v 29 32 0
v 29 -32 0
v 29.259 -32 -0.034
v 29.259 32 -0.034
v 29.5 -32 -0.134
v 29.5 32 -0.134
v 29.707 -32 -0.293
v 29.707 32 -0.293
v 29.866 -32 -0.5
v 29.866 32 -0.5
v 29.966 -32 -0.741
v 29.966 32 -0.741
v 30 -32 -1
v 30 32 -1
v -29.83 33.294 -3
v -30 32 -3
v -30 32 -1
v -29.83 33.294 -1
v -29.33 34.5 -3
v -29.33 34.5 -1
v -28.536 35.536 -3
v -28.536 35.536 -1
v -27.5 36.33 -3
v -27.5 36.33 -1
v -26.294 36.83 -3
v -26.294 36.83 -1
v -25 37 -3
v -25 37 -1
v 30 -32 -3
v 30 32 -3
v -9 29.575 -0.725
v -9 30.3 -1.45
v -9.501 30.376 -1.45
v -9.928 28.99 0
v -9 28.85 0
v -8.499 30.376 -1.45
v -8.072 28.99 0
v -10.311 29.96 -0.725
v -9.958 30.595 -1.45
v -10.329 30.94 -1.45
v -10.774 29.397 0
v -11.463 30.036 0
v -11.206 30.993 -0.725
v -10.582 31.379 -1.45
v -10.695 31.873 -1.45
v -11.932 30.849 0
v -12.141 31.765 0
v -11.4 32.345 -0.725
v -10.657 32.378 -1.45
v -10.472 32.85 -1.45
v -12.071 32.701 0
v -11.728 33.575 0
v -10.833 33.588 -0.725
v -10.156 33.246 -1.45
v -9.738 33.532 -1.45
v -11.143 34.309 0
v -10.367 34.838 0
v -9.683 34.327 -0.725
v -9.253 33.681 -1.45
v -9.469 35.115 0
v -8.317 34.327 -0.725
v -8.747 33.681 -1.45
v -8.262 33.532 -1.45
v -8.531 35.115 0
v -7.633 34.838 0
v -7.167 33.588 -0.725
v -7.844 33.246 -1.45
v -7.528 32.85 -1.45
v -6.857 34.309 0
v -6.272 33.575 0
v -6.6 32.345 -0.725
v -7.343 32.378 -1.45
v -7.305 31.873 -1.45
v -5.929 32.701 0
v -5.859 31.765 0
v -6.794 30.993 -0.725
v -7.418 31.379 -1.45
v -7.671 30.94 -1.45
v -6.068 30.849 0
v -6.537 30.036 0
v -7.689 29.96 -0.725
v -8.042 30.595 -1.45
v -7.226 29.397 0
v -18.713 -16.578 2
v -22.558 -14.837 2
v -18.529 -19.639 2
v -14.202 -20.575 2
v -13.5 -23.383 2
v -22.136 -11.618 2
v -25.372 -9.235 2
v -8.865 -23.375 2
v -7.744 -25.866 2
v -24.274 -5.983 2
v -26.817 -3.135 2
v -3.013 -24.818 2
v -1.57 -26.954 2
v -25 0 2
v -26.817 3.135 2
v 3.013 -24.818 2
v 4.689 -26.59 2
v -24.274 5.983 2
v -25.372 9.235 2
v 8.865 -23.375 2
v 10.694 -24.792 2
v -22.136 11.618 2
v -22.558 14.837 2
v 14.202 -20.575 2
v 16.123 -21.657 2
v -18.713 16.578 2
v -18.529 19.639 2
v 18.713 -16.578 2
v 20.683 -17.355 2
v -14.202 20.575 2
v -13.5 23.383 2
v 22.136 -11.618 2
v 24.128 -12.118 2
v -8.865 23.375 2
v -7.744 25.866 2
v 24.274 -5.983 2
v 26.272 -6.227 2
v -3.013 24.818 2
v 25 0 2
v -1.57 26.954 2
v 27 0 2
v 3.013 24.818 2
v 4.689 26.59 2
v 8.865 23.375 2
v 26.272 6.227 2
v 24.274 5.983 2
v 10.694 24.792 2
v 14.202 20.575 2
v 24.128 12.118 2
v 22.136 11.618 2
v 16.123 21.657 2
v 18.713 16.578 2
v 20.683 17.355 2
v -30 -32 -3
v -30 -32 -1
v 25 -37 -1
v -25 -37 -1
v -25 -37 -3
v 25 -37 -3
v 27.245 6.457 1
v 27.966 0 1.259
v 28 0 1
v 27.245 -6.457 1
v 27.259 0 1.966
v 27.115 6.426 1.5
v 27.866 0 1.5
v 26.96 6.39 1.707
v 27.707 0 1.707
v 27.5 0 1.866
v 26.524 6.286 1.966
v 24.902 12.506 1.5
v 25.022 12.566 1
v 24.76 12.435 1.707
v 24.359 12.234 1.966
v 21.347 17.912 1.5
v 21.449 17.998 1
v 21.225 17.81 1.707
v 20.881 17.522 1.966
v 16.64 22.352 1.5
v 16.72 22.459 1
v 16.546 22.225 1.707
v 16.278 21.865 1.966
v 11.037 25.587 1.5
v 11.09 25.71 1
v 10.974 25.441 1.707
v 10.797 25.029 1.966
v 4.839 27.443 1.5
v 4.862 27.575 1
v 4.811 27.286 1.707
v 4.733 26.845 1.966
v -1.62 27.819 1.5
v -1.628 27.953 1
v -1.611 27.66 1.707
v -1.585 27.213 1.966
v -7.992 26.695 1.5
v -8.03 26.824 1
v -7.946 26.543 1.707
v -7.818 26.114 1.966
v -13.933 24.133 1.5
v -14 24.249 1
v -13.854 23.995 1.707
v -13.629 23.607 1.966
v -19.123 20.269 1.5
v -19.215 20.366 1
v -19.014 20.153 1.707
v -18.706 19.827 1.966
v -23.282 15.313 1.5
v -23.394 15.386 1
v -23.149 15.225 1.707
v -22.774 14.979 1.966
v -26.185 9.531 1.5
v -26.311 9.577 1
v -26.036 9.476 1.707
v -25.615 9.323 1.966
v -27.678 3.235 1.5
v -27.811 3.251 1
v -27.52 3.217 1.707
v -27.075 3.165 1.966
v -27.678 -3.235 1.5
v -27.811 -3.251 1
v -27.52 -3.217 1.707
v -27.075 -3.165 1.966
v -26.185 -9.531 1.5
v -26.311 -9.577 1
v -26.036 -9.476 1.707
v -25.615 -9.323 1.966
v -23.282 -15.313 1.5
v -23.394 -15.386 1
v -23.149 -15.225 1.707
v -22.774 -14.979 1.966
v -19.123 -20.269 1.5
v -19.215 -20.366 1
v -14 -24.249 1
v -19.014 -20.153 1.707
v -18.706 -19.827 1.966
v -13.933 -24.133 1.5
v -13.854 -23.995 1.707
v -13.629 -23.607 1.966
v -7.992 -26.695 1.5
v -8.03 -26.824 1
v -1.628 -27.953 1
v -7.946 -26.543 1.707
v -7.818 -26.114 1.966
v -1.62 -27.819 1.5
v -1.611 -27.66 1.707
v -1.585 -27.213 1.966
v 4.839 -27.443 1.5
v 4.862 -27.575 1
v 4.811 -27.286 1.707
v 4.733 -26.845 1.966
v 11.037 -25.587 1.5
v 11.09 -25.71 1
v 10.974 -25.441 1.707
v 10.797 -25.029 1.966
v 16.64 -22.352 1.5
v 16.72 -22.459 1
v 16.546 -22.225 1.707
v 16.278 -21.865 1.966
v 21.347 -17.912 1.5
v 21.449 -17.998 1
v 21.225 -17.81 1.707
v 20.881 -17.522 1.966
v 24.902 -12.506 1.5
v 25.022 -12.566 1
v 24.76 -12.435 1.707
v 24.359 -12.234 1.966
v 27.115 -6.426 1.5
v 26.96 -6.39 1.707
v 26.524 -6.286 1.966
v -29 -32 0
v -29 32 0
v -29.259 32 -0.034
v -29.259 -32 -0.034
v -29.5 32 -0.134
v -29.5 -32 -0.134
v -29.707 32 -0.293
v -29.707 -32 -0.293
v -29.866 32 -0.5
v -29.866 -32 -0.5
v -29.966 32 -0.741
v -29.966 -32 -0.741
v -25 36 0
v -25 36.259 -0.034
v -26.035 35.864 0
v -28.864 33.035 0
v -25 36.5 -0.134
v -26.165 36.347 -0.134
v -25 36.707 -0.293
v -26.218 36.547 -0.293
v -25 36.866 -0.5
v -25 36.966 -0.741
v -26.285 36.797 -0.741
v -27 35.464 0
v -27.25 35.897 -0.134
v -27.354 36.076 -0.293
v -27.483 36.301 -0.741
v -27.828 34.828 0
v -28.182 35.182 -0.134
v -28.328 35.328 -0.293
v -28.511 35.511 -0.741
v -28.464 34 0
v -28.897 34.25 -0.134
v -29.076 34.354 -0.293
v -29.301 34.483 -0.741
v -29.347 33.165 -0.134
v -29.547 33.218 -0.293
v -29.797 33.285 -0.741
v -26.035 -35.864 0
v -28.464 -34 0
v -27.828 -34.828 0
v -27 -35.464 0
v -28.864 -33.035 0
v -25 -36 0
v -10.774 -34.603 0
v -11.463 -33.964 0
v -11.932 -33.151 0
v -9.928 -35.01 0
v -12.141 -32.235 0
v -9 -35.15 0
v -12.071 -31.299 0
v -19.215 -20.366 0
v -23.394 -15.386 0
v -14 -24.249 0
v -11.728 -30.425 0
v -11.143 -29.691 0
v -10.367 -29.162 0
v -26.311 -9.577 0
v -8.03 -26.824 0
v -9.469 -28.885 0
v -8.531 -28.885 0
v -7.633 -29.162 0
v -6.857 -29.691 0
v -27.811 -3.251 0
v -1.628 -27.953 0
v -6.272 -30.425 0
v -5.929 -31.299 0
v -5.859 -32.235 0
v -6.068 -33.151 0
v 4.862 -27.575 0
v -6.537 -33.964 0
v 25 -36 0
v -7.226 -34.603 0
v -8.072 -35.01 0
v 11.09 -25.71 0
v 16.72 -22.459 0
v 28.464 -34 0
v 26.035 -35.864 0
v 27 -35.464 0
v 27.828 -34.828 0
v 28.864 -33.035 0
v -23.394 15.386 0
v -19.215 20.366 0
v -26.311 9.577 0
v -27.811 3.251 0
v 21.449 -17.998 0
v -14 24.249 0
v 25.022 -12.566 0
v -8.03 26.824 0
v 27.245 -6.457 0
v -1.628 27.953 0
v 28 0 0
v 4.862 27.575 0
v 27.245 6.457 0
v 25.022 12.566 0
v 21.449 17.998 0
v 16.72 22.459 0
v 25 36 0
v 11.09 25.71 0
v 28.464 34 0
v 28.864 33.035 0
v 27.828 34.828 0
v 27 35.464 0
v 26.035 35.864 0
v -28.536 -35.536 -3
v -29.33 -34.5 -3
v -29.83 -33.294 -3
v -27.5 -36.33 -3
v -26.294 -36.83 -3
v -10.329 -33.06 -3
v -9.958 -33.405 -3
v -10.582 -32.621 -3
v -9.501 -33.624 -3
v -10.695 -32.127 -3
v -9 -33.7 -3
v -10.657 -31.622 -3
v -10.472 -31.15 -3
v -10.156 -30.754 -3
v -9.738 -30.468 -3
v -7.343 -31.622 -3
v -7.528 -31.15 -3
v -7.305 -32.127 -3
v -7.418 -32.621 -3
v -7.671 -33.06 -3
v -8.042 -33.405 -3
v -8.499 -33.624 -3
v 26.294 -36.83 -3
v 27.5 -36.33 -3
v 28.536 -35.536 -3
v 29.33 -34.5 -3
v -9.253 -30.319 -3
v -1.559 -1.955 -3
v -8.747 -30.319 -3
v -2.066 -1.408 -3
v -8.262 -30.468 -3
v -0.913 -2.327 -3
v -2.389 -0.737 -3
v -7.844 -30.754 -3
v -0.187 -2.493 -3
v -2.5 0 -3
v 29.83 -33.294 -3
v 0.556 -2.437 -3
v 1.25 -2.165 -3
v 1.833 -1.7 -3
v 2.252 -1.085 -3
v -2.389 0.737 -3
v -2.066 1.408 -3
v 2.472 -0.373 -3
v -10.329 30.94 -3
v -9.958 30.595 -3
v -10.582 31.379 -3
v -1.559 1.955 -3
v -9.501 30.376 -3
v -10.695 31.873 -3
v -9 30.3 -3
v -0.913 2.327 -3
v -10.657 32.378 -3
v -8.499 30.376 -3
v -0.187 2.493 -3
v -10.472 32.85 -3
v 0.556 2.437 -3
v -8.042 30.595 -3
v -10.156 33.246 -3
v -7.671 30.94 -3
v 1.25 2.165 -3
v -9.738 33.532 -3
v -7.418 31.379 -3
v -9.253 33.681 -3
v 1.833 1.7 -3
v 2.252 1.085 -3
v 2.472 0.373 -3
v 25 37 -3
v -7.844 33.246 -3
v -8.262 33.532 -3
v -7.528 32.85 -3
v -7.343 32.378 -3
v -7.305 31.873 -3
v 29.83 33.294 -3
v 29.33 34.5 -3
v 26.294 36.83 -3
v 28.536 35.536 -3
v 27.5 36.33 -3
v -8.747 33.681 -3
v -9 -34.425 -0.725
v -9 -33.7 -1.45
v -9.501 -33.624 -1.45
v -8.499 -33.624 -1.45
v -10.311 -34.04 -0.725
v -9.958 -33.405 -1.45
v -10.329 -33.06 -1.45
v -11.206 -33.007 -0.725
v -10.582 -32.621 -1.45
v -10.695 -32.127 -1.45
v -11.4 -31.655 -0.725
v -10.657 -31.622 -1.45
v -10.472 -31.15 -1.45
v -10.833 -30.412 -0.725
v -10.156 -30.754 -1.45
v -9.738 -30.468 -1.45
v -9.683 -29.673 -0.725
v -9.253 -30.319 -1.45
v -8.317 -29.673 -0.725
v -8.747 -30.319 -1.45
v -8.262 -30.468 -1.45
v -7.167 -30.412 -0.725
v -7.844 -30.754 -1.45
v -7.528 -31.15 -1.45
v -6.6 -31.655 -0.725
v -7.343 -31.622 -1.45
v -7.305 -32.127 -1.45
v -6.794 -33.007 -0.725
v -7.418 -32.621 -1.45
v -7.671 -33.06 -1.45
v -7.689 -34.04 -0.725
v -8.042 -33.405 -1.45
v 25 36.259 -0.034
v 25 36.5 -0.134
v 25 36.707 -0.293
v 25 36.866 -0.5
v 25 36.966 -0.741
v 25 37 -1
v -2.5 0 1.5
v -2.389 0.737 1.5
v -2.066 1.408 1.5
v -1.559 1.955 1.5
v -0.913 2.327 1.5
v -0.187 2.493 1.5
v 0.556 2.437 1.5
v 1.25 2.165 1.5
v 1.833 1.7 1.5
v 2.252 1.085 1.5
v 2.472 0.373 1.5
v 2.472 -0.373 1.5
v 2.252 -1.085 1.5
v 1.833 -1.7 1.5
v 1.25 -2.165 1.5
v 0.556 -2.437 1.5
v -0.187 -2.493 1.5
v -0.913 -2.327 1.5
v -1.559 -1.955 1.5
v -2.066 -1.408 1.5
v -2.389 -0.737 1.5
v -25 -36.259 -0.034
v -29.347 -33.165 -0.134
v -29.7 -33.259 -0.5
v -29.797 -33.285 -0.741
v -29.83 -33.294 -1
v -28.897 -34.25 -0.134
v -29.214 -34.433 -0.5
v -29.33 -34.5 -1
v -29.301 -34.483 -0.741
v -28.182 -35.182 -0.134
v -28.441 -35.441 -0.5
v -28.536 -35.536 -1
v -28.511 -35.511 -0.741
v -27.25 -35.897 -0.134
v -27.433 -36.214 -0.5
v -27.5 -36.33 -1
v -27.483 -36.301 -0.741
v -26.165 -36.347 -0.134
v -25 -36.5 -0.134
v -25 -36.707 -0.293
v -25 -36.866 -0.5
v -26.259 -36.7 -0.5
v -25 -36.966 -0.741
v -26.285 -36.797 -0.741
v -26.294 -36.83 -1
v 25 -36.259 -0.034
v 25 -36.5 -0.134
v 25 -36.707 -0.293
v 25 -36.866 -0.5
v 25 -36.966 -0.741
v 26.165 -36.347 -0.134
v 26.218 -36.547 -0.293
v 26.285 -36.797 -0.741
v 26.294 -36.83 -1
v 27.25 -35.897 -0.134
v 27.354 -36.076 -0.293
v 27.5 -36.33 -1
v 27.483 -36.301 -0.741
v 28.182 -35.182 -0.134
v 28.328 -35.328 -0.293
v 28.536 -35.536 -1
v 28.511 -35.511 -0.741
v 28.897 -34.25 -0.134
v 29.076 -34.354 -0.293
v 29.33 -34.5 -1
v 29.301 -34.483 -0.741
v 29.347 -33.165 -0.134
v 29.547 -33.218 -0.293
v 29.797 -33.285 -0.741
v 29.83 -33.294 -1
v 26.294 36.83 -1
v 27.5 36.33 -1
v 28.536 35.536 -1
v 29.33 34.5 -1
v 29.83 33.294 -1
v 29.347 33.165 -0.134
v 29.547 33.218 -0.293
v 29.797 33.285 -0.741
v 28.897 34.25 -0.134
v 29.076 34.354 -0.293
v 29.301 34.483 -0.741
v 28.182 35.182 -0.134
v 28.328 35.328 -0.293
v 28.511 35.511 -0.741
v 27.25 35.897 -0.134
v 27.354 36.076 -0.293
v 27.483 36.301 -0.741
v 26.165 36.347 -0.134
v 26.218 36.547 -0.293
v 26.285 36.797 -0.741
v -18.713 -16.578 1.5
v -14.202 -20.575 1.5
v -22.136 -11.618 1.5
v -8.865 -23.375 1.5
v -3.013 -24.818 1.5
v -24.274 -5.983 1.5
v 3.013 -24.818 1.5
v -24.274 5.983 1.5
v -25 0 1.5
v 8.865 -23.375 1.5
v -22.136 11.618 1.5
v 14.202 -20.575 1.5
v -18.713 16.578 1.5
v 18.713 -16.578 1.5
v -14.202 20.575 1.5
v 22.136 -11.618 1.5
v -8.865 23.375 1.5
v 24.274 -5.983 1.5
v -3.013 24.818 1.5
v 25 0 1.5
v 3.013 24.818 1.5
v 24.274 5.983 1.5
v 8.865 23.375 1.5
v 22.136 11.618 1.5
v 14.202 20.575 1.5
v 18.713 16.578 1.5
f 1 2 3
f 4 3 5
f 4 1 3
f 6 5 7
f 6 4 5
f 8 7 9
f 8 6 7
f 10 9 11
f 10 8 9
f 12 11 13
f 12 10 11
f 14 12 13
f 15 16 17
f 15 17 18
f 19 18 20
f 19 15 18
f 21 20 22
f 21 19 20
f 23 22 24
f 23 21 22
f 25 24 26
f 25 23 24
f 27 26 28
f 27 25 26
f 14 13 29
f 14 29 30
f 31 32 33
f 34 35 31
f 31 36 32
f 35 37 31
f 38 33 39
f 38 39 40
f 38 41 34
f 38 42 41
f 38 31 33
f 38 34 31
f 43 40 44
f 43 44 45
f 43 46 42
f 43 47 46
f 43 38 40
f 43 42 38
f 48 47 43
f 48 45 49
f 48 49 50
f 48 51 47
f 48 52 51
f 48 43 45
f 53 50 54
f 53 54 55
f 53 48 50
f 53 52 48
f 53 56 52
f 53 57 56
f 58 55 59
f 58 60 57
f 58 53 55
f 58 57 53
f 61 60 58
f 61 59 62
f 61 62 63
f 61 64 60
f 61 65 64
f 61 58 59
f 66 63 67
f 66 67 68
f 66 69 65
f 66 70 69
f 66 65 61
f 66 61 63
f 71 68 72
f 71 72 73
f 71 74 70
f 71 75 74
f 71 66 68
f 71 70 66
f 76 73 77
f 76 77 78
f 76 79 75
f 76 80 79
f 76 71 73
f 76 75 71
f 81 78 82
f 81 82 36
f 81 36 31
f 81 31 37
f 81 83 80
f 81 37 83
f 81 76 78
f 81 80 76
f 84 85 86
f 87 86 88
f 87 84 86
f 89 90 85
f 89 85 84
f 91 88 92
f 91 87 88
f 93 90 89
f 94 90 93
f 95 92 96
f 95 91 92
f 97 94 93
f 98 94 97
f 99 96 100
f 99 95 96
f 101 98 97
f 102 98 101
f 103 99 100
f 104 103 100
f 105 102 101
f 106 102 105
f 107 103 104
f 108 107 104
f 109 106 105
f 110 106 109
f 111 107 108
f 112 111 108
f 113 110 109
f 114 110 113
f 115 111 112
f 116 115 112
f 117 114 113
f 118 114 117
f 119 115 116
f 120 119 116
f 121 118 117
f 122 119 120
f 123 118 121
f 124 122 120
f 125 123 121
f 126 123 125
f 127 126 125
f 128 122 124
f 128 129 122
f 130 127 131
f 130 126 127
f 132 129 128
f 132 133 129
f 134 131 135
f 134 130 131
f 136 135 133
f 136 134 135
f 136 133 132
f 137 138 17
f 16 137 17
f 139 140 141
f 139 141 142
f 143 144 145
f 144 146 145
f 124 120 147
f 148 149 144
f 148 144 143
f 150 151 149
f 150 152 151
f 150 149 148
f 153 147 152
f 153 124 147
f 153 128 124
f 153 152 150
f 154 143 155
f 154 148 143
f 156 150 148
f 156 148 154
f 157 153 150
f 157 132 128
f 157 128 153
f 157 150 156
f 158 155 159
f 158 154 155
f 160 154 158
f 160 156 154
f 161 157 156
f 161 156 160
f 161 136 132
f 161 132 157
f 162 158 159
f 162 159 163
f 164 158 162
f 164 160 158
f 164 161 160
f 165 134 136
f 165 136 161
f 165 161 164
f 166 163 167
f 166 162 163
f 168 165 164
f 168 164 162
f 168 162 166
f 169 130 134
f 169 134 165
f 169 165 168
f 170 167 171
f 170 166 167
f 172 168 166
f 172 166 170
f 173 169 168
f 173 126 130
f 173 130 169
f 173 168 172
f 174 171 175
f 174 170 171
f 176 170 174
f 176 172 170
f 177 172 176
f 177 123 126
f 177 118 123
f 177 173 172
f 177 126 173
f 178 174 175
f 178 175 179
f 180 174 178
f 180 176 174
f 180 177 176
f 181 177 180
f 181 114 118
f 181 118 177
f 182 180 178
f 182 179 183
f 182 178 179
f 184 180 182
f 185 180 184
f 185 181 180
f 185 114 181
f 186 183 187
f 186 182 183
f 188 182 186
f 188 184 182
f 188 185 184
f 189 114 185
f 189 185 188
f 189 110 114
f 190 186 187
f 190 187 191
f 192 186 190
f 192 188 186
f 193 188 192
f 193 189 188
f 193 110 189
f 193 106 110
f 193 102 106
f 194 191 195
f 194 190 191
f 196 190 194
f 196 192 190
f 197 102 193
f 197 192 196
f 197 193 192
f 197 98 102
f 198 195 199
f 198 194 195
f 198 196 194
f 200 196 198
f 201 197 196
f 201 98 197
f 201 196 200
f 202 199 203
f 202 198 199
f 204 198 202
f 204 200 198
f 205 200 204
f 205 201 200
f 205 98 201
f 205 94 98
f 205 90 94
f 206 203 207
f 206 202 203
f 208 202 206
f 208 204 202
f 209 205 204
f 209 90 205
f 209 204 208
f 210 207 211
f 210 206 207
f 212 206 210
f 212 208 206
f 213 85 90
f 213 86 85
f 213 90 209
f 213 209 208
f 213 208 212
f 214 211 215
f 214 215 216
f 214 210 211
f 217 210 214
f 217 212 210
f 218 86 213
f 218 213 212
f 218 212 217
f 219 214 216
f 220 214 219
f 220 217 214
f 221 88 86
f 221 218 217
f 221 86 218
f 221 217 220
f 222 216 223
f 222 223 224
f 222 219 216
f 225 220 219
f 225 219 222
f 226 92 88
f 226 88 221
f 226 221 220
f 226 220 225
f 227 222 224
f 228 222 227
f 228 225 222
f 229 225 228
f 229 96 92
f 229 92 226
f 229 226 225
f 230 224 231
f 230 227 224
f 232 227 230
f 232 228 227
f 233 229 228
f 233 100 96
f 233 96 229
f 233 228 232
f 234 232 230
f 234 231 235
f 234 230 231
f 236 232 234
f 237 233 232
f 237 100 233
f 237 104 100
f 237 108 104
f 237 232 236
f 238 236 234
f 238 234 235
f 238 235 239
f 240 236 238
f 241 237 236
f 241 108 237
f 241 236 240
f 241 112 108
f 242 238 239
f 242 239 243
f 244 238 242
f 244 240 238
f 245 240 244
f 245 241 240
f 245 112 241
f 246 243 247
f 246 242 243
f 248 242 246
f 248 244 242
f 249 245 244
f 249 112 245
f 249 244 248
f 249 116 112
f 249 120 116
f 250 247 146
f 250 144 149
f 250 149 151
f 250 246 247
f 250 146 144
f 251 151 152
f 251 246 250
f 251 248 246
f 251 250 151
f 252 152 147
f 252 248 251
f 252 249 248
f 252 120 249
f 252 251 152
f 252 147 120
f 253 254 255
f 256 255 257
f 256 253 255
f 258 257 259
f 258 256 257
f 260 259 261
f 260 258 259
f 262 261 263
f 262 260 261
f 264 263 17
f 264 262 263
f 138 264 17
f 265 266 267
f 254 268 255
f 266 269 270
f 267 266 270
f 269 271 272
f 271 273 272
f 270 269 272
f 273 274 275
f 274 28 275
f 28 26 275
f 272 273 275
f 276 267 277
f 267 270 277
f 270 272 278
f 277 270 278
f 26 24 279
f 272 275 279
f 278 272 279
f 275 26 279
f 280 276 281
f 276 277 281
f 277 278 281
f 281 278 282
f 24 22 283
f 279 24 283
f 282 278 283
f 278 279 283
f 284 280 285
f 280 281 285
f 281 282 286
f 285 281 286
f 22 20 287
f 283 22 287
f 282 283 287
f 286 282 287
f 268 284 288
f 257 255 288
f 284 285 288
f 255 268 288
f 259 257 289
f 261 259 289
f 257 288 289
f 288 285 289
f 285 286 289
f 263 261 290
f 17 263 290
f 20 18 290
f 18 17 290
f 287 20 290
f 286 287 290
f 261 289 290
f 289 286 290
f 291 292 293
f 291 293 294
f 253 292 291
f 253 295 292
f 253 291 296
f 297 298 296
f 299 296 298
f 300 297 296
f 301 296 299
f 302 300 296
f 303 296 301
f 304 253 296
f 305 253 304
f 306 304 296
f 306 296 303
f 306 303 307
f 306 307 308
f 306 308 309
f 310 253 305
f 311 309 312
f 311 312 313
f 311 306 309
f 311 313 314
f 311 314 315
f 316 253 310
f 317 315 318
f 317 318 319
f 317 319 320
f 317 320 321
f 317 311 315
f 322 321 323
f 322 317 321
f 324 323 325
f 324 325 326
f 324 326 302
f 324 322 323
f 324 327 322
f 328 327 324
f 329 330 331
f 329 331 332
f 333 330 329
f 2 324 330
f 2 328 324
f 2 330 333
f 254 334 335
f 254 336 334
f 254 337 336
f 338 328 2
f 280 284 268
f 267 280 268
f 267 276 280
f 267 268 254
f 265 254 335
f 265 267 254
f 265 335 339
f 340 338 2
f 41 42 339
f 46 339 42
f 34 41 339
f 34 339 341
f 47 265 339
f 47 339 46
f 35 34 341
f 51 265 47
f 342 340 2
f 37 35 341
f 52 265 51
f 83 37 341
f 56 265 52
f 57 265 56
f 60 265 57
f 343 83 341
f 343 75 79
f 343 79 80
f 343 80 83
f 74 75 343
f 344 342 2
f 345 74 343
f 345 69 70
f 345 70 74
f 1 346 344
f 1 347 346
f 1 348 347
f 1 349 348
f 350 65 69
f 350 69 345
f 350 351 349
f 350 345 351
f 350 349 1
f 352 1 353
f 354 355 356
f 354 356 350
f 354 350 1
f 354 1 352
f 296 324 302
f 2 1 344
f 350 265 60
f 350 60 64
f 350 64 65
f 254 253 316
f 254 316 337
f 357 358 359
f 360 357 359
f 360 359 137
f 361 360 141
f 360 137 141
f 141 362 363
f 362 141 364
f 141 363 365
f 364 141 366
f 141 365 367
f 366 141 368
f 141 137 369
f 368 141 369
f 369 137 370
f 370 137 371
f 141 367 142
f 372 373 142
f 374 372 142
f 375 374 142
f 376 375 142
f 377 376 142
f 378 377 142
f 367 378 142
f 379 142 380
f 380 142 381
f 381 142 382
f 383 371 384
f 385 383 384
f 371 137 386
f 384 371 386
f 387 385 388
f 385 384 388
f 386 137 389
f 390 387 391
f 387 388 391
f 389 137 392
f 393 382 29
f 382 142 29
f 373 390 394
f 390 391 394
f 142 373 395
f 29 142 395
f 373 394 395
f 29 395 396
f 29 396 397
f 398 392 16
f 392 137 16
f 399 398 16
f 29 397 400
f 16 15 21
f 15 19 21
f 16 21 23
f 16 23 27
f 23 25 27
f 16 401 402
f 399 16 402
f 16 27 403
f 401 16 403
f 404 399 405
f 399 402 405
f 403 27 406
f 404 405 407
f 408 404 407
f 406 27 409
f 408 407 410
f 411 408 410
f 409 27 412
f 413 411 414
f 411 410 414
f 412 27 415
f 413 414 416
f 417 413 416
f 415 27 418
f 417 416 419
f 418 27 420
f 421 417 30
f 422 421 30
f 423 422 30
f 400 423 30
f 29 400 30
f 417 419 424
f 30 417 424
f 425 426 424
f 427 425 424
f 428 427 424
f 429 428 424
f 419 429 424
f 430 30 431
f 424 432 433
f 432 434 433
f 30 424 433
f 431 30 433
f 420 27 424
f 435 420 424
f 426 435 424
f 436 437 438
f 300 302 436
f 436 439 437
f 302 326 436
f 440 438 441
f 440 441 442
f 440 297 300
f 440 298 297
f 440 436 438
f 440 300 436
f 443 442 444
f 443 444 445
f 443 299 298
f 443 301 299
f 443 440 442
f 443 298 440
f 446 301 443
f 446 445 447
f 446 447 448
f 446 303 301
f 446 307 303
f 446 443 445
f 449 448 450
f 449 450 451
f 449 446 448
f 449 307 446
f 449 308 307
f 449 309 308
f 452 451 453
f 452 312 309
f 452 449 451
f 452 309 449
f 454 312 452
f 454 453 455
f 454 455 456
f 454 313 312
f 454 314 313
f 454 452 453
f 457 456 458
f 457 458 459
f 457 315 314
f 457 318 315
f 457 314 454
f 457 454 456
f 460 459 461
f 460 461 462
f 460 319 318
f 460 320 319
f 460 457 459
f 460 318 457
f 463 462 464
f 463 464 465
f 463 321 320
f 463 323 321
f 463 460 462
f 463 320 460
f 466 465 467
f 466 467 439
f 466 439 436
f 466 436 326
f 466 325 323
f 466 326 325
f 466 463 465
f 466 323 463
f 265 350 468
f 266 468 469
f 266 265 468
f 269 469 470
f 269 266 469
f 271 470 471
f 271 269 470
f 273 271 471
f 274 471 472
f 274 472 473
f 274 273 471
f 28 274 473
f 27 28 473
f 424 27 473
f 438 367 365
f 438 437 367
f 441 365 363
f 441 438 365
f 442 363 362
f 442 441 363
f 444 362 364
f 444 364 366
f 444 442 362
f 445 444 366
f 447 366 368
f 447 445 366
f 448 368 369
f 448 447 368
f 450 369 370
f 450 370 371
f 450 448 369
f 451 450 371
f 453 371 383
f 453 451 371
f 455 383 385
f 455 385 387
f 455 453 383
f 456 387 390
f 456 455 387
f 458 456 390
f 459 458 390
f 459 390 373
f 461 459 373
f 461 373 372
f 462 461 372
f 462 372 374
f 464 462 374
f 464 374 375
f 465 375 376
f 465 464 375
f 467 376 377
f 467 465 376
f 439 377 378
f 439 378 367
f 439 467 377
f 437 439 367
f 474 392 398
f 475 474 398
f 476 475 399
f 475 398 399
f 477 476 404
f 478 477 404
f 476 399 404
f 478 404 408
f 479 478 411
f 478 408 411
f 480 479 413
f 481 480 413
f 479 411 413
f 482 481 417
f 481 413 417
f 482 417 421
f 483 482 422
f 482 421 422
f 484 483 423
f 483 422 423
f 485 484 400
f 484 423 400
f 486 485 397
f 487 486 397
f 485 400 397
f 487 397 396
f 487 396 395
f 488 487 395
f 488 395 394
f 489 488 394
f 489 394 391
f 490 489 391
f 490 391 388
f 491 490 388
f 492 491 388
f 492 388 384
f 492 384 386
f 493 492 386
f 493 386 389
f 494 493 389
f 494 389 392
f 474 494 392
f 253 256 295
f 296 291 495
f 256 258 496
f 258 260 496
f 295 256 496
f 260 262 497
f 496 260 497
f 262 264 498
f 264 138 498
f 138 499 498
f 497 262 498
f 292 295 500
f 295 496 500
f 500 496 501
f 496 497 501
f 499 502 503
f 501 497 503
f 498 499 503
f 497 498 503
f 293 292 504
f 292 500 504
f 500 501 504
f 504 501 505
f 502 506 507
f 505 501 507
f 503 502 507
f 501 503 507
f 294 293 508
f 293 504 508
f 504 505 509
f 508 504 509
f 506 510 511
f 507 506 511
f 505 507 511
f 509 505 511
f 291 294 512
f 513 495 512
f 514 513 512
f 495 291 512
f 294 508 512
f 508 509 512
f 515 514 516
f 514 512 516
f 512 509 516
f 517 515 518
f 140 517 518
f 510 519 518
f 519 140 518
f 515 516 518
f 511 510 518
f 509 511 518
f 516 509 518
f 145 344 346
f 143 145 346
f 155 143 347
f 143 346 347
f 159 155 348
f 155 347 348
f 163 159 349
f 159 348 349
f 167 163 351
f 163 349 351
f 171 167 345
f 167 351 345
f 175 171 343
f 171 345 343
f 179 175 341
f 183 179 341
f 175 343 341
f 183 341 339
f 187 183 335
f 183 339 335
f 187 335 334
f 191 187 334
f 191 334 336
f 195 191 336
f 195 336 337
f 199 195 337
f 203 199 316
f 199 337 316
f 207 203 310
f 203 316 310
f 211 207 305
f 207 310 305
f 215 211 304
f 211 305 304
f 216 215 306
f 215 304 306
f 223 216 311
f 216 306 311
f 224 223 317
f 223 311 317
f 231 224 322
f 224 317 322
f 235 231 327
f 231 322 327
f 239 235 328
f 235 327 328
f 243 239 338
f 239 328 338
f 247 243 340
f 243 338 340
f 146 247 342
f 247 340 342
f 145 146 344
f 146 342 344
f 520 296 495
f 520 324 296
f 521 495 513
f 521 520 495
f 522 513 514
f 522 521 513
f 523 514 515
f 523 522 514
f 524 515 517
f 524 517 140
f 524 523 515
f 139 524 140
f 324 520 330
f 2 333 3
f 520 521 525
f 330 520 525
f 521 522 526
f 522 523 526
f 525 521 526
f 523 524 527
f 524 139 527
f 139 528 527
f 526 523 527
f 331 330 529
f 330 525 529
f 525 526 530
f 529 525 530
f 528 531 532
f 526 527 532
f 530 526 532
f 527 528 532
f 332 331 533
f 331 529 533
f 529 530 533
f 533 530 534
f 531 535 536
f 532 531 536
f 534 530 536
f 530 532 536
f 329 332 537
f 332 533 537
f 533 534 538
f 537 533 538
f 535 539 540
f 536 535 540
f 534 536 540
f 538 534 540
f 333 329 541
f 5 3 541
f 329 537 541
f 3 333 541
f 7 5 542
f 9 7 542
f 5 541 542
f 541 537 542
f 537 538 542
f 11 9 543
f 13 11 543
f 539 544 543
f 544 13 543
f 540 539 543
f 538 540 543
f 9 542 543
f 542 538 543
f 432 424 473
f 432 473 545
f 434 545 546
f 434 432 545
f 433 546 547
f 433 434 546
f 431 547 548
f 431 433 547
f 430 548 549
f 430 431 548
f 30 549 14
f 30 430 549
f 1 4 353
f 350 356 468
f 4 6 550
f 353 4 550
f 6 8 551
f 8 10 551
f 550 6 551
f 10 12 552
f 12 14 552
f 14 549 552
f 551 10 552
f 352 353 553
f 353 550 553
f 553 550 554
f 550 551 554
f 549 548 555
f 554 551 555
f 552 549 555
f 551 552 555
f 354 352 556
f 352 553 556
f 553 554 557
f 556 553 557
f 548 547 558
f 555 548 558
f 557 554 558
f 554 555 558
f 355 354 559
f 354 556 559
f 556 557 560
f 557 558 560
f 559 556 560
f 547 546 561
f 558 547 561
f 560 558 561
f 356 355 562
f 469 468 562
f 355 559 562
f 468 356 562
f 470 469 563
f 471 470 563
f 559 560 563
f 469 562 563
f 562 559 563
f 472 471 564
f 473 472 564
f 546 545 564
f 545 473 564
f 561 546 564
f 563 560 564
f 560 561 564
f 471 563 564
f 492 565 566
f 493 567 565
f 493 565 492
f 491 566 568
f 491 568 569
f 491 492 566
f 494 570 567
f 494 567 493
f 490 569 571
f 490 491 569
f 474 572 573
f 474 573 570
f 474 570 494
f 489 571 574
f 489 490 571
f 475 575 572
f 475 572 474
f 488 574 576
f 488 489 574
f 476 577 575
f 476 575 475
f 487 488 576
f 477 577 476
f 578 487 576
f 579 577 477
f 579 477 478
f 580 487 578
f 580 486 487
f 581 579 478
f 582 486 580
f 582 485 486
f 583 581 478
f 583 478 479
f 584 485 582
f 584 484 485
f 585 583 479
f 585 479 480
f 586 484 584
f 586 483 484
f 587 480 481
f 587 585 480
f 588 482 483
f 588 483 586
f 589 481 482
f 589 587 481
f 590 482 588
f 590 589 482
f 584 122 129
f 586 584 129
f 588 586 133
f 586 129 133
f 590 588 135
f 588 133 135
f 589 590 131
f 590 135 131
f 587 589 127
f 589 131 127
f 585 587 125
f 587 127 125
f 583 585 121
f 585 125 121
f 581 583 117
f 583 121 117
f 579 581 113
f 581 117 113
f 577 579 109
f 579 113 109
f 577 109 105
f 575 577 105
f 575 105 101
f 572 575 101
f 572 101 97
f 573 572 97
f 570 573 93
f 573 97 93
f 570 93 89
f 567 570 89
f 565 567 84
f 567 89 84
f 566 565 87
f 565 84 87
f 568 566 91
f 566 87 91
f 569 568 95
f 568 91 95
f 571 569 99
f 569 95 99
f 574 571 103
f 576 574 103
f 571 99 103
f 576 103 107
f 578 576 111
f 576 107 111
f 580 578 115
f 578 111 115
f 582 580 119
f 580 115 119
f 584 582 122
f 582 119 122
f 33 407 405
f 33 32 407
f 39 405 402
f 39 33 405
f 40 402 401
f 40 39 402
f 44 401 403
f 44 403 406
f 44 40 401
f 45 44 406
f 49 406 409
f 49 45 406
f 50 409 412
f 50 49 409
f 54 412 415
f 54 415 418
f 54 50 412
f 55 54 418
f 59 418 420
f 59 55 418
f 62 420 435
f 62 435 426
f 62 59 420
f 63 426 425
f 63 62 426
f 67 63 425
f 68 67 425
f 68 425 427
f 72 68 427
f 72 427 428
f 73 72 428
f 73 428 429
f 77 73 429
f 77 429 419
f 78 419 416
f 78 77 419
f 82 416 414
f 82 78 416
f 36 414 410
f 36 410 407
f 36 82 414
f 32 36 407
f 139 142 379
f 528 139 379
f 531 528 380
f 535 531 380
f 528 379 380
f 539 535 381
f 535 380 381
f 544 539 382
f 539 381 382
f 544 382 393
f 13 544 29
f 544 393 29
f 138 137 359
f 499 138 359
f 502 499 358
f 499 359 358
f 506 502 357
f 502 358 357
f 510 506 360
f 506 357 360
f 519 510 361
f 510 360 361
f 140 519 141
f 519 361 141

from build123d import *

# Parameters (mm, degrees)
ESQUISSE1_W                                 = 60
ESQUISSE1_H                                 = 74
BOSS_EXTRU_1_DEPTH                          = 3
ESQUISSE2_R                                 = 28
BOSS_EXTRU_2_DEPTH                          = 2
ESQUISSE6_R                                 = 25
ENL_V_MAT_EXTRU_4_DEPTH                     = 0.5
CONG_5_R                                    = 5
CONG_1_R                                    = 1
ESQUISSE7_R                                 = 2.5
ENL_V_MAT_EXTRU_5_DEPTH                     = 48.895720059
FRAISAGE_POUR_VIS_T_TE_FRAIS_E_M31_AT_COUNT = 2
FRAISAGE_POUR_VIS_T_TE_FRAIS_E_M31_AT_PITCH = 64


with BuildPart() as part:
    # Esquisse1 → Boss.-Extru.1 (new body)
    with BuildSketch(Plane.XY):
        Rectangle(ESQUISSE1_W, ESQUISSE1_H)
    extrude(amount=-BOSS_EXTRU_1_DEPTH)

    # Esquisse2 → Boss.-Extru.2 (add)
    with BuildSketch(Plane.XY):
        Circle(ESQUISSE2_R)
    extrude(amount=BOSS_EXTRU_2_DEPTH)

    # Esquisse6 → Enlèv. mat.-Extru.4 (cut)
    with BuildSketch(Plane.XY.offset(2)):
        Circle(ESQUISSE6_R)
    extrude(amount=-ENL_V_MAT_EXTRU_4_DEPTH, mode=Mode.SUBTRACT)

    # Congé 5
    cong_5_edges = [part.edges().sort_by_distance(p)[0] for p in [
        (-30, 37, -1.5),
        (30, 37, -1.5),
        (30, -37, -1.5),
        (-30, -37, -1.5),
    ]]
    fillet(cong_5_edges, radius=CONG_5_R)

    # Congé1
    cong_1_edges = [part.edges().sort_by_distance(p)[0] for p in [
        (-28, 0, 2),
        (0, -37, 0),
        (-30, 0, 0),
        (30, 0, 0),
        (0, 37, 0),
        (-28.535533906, 35.535533906, 0),
        (28.535533906, 35.535533906, 0),
        (-28.535533906, -35.535533906, 0),
        (28.535533906, -35.535533906, 0),
    ]]
    fillet(cong_1_edges, radius=CONG_1_R)

    # Esquisse7 → Enlèv. mat.-Extru.5 (cut, through all)
    with BuildSketch(Plane(origin=(0, 0, -3), x_dir=(-1, 0, 0), z_dir=(0, 0, -1))):
        Circle(ESQUISSE7_R)
    extrude(amount=-ENL_V_MAT_EXTRU_5_DEPTH, mode=Mode.SUBTRACT)

    # Esquisse8 → Fraisage pour vis à tête fraisée M31 (revolve, cut)
    with BuildSketch(Plane(origin=(-9, 32, 0), x_dir=(0, -1, 0), z_dir=(1, 0, 0))):
        Polygon((0, 0), (0, 3), (1.7, 3), (1.7, 1.45), (3.15, 0), align=None)
    fraisage_pour_vis_t_te_frais_e_m31 = revolve(axis=Axis((-9, 32, 6.35), (0, 0, -1)), mode=Mode.SUBTRACT)

    # Fraisage pour vis à tête fraisée M31 at: Fraisage pour vis à tête fraisée M31 ×2
    with Locations(*[(0, -i * FRAISAGE_POUR_VIS_T_TE_FRAIS_E_M31_AT_PITCH, 0) for i in range(1, FRAISAGE_POUR_VIS_T_TE_FRAIS_E_M31_AT_COUNT)]):
        add(fraisage_pour_vis_t_te_frais_e_m31, mode=Mode.SUBTRACT)


solid = part.part
